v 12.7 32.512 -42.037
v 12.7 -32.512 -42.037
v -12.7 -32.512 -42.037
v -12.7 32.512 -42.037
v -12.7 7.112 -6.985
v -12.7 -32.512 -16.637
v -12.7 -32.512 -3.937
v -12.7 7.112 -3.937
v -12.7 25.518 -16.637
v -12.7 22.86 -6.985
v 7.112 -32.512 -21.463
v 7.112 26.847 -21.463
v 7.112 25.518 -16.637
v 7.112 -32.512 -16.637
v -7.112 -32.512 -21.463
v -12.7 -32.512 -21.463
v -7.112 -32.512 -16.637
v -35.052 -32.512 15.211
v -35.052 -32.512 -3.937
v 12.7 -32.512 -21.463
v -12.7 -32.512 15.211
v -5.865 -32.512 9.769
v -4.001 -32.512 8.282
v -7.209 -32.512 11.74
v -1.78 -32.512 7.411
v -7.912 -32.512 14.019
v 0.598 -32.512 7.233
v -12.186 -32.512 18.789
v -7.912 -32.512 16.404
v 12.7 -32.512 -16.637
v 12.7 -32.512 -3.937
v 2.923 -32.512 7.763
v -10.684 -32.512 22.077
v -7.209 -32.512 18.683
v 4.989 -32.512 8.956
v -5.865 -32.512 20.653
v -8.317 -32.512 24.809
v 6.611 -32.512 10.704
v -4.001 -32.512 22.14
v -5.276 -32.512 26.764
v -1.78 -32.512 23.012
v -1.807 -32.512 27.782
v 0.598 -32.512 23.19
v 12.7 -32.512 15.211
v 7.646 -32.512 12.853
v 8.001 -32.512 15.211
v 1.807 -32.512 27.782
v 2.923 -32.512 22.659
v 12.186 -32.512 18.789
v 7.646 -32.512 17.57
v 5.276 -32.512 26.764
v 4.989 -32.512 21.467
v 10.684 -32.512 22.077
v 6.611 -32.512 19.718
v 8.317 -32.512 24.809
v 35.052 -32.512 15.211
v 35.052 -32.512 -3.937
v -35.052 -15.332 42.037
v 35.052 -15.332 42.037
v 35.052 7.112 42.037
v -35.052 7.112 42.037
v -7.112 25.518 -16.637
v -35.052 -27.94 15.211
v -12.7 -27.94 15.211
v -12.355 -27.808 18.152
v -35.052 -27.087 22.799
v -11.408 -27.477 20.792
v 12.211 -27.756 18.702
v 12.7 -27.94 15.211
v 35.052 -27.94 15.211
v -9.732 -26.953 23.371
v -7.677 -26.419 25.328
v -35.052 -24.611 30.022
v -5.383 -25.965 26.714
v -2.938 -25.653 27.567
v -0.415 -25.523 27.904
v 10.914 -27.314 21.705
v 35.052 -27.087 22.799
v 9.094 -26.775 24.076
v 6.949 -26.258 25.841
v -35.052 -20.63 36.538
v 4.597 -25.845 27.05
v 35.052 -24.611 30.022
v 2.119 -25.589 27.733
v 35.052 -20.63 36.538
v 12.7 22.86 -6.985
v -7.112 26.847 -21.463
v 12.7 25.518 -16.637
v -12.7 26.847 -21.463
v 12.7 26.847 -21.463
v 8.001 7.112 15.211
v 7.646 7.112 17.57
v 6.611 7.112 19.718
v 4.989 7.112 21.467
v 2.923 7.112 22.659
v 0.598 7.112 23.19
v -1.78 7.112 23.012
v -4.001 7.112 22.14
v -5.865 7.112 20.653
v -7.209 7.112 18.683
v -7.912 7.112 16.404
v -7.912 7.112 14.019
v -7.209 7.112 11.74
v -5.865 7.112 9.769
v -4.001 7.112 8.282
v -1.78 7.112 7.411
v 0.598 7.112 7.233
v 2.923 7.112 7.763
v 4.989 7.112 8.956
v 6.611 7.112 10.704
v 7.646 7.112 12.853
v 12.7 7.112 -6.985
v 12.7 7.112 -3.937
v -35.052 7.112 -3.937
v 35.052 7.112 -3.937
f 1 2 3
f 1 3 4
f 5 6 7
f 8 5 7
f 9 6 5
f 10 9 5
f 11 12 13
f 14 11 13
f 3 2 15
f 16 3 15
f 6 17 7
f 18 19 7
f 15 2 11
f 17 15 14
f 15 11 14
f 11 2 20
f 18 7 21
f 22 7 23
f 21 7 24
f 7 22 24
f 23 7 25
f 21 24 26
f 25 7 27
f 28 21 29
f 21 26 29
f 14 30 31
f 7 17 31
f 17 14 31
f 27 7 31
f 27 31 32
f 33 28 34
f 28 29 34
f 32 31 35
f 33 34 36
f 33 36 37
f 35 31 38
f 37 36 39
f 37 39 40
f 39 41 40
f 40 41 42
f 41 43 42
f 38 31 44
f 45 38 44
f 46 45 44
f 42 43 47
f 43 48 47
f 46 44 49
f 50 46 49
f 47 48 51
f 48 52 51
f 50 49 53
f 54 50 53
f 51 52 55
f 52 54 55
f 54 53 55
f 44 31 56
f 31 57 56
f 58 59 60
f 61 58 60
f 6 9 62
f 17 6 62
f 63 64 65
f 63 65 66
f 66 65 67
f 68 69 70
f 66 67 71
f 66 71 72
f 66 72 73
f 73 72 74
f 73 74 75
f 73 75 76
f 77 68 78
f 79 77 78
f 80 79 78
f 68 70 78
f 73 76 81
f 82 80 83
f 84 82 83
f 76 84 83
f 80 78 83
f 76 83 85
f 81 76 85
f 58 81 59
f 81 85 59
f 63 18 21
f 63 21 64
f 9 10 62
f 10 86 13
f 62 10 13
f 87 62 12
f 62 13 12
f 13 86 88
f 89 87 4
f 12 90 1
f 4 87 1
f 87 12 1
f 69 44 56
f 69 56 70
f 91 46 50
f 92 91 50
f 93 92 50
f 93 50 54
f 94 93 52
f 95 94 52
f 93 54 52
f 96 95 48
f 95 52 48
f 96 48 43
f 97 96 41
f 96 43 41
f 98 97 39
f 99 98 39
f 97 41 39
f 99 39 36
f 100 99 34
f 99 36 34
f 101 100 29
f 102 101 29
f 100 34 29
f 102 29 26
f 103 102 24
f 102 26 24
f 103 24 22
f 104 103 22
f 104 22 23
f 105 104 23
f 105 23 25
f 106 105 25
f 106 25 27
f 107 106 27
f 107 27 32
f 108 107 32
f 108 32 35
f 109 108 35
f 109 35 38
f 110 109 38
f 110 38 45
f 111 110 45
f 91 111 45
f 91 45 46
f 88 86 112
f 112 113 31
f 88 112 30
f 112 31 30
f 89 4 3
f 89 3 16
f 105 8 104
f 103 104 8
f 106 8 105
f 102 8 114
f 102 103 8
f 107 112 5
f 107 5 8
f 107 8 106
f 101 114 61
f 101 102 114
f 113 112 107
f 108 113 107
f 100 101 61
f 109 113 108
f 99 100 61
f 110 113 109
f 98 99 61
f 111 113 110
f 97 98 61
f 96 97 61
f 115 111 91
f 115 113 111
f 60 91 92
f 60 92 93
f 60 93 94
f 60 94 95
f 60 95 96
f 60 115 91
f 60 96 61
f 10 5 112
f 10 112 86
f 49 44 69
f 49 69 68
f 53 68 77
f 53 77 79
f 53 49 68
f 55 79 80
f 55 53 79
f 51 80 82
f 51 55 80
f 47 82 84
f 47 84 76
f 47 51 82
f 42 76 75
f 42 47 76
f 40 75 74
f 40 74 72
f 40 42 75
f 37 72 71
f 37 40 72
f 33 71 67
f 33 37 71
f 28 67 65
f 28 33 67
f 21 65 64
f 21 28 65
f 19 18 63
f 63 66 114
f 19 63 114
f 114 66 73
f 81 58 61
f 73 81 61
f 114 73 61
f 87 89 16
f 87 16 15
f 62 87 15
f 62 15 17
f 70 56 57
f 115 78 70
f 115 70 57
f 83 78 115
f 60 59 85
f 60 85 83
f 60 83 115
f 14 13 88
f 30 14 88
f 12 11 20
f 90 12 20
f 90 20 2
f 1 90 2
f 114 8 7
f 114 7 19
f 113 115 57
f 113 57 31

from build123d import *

# Parameters (mm, degrees)
F0_W      = 65.024
F0_H      = 84.074
F1_DEPTH  = 35.052
F2_W      = 5.588
F2_H      = 4.826
F3_DEPTH  = 127
F4_W      = 62.676213
F4_H      = 69.311896
F5_DEPTH  = 127
F7_DEPTH  = 127
F9_DEPTH  = 127
F11_DEPTH = 25.4
F12_R     = 8.001
F13_DEPTH = 65.025


with BuildPart() as f1:
    # F0 (on Right) → F1 (new body, symmetric)
    with BuildSketch(Plane.YZ):
        Rectangle(F0_W, F0_H)
    extrude(amount=F1_DEPTH, both=True)

    # F2 (on Front) → F3 (cut, symmetric)
    with BuildSketch(Plane.XZ):
        Polygon((-44.45, -3.937), (-44.45, -71.304262), (-12.7, -71.304262), (-12.7, -21.463), (-12.7, -16.637), (-12.7, -3.937), align=None)
        with Locations((-9.906, -19.05)):
            Rectangle(F2_W, F2_H)
        Polygon((44.45, -3.937), (12.7, -3.937), (12.7, -16.637), (12.7, -21.463), (12.7, -71.188014), (44.45, -71.188014), align=None)
        with Locations((9.906, -19.05)):
            Rectangle(F2_W, F2_H)
    extrude(amount=F3_DEPTH, both=True, mode=Mode.SUBTRACT)

    # F4 (on Right) → F5 (cut, symmetric)
    with BuildSketch(Plane.YZ):
        with Locations((38.450106, 27.670948)):
            Rectangle(F4_W, F4_H)
    extrude(amount=F5_DEPTH, both=True, mode=Mode.SUBTRACT)

    # F6 (on face) → F7 (cut, symmetric)
    with BuildSketch(Plane.YZ.offset(12.7)):
        Polygon((22.86, -6.985026), (32.512, -42.037), (51.482223, -29.319761), (47.049891, -1.715869), align=None)
    extrude(amount=F7_DEPTH, both=True, mode=Mode.SUBTRACT)

    # F8 (on Right) → F9 (cut, symmetric)
    with BuildSketch(Plane.YZ):
        with BuildLine():
            ThreePointArc((-27.939862, 15.211211), (-17.712772, 39.85918), (6.902644, 50.164375))
            Line((6.902644, 50.164375), (-42.650253, 55.479672))
            Line((-42.650253, 55.479672), (-50.782111, 15.211211))
            Line((-50.782111, 15.211211), (-27.939862, 15.211211))
        make_face()
    extrude(amount=F9_DEPTH, both=True, mode=Mode.SUBTRACT)

    # F10 (on face) → F11 (join)
    with BuildSketch(Plane.XZ.offset(32.512)):
        with BuildLine():
            Line((-12.7, 15.211211), (12.7, 15.211211))
            ThreePointArc((12.7, 15.211211), (0, 27.911211), (-12.7, 15.211211))
        make_face()
        with BuildLine():
            ThreePointArc((-12.7, 15.211211), (0, 2.511211), (12.7, 15.211211))
            Line((12.7, 15.211211), (-12.7, 15.211211))
        make_face()
    extrude(amount=-F11_DEPTH)

    # F12 (on face) → F13 (cut, through all)
    with BuildSketch(Plane.XZ.offset(32.512)):
        with Locations((0, 15.211211)):
            Circle(F12_R)
    extrude(amount=-F13_DEPTH, mode=Mode.SUBTRACT)


solid = f1.part
